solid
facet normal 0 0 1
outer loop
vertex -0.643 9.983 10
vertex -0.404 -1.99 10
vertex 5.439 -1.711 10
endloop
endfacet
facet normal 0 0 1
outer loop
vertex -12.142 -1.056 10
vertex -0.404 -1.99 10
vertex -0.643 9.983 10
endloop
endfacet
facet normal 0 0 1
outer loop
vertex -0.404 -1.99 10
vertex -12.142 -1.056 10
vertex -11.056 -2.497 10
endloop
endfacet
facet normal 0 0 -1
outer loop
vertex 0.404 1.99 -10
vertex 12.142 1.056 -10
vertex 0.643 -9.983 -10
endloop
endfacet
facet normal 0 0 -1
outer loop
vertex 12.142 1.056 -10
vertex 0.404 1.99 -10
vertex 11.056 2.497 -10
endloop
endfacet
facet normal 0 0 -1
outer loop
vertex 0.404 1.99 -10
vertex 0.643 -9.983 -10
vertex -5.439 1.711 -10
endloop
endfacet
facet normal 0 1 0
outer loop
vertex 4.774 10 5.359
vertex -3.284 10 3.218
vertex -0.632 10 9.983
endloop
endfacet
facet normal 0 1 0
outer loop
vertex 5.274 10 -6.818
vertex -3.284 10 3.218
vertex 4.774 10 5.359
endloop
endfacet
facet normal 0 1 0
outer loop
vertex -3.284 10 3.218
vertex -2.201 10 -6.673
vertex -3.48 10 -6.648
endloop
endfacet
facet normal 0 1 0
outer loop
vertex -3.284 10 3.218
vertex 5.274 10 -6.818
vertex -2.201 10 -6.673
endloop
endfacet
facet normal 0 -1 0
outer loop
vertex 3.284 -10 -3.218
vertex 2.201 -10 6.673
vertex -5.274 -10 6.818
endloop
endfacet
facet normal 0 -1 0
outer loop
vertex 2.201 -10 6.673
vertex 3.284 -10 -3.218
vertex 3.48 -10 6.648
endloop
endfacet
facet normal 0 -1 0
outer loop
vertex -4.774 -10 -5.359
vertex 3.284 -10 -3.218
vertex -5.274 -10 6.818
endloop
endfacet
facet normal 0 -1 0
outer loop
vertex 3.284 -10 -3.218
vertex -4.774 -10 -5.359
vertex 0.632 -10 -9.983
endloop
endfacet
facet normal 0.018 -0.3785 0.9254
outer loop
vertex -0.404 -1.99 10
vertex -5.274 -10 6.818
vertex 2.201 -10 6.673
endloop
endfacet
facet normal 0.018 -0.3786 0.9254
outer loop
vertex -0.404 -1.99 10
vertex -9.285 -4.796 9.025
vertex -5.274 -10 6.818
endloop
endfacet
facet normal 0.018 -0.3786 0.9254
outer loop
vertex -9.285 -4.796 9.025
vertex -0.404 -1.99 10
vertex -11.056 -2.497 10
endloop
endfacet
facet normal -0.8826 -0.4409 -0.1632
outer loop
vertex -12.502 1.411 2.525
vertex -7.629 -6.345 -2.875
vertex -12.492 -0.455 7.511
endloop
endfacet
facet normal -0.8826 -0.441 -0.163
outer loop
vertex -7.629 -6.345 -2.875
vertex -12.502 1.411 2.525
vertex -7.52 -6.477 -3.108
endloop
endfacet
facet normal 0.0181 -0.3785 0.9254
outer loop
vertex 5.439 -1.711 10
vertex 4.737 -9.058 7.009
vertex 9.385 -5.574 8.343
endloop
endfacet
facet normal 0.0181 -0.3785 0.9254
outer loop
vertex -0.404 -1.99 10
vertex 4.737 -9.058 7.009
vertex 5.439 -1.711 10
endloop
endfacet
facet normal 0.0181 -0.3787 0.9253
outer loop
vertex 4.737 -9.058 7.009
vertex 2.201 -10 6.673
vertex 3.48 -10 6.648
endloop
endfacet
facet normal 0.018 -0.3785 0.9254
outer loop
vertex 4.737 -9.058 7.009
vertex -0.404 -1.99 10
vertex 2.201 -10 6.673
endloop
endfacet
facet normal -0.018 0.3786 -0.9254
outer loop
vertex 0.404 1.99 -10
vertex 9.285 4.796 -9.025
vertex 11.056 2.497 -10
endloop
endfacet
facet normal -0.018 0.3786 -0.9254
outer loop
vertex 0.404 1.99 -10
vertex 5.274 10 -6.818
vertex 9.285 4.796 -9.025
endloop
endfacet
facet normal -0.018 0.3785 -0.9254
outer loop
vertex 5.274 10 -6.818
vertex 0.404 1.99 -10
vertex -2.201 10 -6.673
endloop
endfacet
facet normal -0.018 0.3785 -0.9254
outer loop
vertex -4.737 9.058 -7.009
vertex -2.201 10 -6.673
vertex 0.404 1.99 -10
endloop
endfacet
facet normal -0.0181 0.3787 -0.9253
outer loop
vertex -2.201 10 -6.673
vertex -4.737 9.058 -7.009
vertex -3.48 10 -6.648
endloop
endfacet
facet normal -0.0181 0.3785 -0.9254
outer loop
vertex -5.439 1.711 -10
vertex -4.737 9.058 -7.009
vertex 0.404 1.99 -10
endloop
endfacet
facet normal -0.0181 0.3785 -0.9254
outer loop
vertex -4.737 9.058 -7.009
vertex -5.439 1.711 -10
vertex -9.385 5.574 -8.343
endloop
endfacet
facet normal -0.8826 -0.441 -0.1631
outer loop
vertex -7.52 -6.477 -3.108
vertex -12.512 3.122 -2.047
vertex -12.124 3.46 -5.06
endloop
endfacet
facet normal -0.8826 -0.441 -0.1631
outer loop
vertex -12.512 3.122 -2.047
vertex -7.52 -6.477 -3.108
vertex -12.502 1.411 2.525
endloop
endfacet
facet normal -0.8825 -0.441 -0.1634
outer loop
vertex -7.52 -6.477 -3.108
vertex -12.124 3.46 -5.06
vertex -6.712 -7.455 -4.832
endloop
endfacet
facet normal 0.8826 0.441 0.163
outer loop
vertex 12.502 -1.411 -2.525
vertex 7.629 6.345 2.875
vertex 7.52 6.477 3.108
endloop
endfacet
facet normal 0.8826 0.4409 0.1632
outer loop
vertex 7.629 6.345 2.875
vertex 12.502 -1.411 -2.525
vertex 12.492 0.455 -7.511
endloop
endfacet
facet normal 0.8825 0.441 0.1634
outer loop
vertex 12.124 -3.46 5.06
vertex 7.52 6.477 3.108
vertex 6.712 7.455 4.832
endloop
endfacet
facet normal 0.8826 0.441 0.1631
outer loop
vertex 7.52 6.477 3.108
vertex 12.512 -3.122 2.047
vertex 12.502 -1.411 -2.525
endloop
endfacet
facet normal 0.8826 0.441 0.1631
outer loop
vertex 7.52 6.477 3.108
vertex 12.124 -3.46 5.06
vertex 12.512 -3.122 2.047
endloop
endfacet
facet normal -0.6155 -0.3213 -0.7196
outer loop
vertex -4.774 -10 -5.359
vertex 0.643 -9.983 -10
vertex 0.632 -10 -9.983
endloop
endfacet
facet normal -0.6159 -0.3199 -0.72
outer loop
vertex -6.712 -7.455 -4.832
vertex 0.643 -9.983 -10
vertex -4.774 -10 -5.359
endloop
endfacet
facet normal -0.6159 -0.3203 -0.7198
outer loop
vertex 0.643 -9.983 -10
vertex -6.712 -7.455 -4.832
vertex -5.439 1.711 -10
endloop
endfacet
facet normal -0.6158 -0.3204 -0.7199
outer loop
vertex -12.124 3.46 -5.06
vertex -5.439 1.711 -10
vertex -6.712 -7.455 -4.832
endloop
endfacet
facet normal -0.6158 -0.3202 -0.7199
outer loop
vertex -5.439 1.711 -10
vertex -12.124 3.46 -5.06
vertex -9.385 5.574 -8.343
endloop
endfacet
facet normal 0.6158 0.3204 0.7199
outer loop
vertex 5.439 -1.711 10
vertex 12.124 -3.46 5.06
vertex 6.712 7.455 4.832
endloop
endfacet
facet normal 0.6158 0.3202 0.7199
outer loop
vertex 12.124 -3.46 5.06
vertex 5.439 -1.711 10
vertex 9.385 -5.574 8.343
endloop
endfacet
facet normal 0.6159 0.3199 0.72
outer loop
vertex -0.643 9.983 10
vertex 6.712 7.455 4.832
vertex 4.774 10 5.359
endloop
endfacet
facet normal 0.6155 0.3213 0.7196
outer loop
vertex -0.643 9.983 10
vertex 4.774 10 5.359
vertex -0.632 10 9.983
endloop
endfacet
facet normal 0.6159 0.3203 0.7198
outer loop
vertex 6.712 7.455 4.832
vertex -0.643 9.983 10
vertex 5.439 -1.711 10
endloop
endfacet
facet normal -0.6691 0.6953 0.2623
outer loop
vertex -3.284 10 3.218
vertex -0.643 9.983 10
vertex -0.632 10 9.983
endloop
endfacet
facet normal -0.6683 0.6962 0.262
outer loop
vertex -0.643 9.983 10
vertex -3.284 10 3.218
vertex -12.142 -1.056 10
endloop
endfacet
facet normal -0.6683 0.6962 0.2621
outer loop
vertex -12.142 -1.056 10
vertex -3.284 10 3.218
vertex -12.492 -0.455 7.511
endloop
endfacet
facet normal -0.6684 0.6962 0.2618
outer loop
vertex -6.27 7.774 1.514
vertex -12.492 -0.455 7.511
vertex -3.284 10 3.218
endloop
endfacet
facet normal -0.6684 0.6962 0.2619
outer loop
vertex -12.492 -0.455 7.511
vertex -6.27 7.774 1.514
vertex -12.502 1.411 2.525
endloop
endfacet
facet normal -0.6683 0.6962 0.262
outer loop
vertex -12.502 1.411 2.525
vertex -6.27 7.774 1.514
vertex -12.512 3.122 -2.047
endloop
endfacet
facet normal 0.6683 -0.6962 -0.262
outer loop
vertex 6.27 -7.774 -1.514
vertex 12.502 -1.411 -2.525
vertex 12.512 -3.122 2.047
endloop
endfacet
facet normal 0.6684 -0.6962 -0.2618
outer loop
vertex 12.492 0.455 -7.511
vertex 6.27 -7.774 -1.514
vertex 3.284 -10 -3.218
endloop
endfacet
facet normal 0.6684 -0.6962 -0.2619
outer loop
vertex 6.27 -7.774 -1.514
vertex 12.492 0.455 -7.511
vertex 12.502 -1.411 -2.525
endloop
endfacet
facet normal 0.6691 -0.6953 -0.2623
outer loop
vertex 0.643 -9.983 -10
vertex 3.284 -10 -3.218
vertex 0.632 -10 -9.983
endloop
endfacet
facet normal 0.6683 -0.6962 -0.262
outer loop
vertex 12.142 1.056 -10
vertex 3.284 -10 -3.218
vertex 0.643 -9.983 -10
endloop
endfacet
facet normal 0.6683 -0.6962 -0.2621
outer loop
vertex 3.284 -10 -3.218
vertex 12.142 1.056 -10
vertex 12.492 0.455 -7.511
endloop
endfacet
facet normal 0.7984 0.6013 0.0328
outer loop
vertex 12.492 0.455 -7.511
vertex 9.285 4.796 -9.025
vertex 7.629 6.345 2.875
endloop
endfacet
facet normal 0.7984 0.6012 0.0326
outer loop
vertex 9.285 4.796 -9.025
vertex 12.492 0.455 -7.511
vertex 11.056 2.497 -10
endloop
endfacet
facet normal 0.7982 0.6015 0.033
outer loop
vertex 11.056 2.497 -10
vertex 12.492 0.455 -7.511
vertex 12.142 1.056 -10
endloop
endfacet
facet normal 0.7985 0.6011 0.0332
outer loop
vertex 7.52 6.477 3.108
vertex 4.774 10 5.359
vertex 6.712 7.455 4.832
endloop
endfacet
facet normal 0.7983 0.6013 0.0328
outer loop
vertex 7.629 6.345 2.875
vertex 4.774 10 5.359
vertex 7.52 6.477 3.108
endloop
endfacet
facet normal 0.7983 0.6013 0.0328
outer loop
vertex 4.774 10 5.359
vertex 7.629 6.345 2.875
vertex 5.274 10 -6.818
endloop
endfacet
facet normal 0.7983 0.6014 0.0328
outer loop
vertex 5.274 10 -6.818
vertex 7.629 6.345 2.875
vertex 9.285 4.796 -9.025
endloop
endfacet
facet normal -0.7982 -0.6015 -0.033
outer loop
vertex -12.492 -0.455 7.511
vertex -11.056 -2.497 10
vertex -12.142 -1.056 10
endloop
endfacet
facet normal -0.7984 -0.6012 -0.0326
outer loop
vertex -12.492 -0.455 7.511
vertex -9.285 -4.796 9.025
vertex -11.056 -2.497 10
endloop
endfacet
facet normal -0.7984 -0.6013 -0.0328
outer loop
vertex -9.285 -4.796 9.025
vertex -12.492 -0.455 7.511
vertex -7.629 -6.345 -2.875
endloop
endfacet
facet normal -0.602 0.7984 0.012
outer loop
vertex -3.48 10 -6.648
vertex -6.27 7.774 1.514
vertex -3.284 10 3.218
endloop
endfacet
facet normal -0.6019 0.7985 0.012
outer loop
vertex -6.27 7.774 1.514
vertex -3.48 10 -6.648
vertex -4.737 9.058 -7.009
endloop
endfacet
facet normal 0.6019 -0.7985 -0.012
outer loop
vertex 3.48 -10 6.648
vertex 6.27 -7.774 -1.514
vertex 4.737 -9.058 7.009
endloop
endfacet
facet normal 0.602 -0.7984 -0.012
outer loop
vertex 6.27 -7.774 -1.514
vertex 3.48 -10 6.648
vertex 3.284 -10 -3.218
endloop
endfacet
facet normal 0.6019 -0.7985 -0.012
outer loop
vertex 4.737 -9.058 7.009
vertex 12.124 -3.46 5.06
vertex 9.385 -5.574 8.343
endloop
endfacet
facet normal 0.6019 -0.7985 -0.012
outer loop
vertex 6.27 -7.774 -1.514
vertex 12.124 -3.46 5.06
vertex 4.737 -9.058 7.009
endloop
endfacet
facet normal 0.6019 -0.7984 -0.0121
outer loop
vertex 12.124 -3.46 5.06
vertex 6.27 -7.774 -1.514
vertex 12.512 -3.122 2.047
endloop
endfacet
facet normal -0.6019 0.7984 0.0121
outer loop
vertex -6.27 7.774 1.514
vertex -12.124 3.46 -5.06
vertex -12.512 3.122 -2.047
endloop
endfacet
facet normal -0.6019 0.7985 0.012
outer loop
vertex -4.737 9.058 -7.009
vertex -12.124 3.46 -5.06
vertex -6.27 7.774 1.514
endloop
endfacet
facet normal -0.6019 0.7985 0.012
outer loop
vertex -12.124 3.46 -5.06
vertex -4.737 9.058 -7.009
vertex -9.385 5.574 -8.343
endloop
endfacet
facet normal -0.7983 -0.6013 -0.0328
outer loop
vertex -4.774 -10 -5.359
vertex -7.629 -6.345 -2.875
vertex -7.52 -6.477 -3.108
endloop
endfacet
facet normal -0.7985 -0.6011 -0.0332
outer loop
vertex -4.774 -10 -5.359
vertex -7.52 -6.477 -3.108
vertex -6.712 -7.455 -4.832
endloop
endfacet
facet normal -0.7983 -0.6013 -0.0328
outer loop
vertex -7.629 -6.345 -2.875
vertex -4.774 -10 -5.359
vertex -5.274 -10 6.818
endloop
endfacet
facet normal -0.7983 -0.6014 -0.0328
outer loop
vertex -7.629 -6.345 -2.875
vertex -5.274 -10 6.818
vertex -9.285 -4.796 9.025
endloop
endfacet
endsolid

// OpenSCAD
//created with rubyscad 1.0

intersection() {
   rotate(a = [0, 0, 0]) 
   cube(size = [100, 20, 20], center = true); 
   rotate(a = [10, 20, 300]) 
   cube(size = [100, 20, 20], center = true); 
   rotate(a = [200, 40, 57]) 
   cube(size = [100, 20, 20], center = true); 
   rotate(a = [20, 88, 57]) 
   cube(size = [100, 20, 20], center = true); 
}
